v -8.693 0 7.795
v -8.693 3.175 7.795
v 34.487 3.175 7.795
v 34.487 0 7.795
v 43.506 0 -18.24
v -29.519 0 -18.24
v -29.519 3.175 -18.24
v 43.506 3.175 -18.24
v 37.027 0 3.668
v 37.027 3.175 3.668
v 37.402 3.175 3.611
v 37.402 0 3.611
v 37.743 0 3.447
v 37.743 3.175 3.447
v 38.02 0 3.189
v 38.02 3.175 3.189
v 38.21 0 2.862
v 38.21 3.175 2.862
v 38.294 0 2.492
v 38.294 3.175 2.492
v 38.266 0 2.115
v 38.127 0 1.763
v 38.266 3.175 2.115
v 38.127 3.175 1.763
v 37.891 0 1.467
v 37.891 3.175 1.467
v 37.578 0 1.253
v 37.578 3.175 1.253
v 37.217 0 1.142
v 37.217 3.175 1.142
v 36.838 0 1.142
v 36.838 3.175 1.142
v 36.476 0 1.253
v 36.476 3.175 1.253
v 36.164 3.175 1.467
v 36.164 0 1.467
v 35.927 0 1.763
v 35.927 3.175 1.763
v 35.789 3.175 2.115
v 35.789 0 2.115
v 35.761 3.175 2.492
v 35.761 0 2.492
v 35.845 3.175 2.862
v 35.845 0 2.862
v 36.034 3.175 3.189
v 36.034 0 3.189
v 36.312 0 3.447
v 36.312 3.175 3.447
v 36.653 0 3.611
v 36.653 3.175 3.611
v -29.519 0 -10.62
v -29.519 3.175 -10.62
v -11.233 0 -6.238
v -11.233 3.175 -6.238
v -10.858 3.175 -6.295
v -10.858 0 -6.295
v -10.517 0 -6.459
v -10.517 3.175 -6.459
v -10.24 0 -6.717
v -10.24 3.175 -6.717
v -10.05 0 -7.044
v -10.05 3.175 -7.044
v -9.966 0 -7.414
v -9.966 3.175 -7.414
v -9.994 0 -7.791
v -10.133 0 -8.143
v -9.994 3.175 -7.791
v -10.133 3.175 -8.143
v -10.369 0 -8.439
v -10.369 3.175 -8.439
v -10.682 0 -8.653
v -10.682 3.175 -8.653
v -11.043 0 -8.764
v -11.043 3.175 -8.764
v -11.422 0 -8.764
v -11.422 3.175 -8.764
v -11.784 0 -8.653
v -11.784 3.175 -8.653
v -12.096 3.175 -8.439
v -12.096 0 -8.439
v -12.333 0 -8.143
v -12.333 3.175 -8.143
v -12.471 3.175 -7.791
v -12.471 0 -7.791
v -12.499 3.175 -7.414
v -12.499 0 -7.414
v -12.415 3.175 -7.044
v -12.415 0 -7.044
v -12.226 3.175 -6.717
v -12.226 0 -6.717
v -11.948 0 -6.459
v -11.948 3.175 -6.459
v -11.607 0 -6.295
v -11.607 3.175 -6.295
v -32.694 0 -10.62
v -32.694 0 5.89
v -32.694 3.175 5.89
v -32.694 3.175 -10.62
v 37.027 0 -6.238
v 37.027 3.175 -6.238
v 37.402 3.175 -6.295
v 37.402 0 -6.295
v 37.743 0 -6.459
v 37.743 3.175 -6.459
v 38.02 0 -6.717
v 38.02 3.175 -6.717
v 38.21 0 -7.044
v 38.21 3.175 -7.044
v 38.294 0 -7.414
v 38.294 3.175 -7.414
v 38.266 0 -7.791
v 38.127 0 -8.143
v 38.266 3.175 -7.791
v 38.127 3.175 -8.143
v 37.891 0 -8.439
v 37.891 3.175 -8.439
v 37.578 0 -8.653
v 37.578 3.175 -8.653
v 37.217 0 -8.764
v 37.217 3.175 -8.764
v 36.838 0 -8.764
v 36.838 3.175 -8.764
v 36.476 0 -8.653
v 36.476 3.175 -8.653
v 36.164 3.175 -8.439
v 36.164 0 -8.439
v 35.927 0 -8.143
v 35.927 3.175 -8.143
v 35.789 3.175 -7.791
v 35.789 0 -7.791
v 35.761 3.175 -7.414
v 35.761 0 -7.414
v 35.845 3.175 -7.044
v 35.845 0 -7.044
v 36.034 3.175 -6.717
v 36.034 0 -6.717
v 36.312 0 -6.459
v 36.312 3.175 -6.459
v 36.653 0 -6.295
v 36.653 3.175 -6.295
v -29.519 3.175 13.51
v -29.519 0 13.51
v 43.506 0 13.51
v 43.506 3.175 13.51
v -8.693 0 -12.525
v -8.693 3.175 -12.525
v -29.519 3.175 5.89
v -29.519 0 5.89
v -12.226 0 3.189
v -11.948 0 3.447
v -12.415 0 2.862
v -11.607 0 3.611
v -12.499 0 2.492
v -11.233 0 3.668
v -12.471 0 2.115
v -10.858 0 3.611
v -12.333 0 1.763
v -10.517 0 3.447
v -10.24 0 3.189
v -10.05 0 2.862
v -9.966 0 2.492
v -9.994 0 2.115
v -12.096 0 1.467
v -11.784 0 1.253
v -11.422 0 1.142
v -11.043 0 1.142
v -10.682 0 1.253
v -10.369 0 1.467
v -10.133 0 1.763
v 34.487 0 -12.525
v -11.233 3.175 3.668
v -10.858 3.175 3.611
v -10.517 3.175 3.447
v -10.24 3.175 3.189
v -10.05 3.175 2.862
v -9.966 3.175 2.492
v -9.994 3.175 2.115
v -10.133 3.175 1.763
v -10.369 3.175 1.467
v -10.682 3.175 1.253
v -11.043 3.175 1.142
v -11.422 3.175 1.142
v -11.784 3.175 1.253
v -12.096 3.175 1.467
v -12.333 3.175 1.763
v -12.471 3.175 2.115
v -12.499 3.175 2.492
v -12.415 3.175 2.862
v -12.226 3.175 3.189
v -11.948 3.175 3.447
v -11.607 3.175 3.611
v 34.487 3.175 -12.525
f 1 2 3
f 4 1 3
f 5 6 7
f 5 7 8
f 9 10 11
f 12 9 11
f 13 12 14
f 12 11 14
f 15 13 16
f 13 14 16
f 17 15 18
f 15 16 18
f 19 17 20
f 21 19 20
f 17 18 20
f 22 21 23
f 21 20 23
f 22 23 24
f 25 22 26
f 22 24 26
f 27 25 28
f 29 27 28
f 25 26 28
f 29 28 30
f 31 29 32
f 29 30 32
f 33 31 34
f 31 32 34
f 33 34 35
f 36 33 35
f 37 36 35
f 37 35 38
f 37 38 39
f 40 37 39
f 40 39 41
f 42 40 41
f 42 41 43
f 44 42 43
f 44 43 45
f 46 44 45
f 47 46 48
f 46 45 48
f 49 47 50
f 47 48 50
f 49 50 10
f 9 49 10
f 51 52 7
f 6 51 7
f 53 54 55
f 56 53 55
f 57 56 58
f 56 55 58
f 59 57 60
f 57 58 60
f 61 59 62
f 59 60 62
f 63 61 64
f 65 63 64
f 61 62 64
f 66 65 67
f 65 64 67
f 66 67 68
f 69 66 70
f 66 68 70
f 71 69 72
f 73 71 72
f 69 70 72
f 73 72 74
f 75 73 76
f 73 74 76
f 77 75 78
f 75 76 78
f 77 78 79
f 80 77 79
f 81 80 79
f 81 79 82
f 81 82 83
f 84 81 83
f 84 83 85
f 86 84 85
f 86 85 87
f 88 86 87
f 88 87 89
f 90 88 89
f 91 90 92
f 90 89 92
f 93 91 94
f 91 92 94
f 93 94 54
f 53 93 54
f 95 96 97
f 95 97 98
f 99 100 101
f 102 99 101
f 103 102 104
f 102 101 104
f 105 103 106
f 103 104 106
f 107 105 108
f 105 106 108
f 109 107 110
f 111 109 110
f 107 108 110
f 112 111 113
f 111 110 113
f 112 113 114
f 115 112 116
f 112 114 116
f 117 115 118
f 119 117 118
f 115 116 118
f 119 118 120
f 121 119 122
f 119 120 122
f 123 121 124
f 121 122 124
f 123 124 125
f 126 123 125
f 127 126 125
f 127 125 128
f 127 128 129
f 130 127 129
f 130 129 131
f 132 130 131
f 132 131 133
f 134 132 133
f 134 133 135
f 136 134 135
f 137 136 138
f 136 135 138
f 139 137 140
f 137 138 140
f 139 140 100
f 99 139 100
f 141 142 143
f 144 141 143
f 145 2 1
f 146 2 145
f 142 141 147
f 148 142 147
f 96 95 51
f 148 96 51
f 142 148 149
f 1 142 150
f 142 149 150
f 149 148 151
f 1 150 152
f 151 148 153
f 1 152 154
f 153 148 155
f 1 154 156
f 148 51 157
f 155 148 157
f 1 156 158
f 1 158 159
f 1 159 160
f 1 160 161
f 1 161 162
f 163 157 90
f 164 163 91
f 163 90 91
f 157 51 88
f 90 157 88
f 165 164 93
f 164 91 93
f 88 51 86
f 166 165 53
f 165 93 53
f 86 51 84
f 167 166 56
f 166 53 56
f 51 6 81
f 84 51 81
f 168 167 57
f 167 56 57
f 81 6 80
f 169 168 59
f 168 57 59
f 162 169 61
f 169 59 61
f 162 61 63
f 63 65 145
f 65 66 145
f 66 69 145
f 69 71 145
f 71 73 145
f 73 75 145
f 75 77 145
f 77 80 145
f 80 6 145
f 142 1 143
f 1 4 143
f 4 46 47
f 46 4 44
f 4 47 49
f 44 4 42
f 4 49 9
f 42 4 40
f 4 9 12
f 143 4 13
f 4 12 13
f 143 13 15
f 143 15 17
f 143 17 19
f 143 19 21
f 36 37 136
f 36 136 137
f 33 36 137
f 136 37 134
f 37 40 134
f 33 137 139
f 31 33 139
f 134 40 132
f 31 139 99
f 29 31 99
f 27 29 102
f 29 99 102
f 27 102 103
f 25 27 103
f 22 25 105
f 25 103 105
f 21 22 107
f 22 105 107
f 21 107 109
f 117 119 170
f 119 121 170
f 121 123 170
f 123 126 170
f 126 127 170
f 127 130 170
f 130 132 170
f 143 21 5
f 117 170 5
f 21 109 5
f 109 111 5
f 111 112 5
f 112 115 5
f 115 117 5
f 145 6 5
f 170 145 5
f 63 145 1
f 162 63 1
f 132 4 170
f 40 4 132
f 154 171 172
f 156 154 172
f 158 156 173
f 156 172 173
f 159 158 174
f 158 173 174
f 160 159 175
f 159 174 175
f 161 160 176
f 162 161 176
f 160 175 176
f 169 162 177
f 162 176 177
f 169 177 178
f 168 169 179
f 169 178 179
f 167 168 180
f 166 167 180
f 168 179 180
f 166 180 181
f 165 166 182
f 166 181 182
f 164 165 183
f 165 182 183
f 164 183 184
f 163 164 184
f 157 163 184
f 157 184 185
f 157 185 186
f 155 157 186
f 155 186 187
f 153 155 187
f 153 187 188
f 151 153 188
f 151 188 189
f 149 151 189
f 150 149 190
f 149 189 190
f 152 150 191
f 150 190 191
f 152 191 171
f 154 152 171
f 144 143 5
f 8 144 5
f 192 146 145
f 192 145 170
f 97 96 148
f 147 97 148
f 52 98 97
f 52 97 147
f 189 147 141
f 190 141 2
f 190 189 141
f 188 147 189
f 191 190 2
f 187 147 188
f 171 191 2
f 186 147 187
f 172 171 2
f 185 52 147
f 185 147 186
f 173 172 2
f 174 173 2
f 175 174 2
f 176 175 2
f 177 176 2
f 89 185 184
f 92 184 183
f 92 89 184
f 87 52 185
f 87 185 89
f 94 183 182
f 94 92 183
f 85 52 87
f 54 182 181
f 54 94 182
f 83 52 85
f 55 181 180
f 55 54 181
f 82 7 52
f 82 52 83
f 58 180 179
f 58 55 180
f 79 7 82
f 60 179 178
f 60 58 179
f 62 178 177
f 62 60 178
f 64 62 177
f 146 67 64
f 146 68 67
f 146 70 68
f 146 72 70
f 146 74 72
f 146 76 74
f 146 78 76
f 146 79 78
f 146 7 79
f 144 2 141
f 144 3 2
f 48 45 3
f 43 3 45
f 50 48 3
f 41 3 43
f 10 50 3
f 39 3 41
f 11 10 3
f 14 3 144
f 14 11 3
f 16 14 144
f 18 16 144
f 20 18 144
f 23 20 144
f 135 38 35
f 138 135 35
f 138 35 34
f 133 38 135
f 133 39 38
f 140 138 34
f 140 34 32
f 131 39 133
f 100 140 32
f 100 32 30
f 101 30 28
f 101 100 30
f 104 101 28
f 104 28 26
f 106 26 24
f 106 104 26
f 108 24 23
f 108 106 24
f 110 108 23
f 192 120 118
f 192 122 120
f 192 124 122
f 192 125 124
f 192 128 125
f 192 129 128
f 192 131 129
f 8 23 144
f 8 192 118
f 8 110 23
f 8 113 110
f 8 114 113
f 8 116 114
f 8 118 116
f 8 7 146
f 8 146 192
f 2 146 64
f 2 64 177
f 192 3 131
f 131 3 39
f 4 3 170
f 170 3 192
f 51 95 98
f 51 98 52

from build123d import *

# Parameters (mm, degrees)
SKETCH1_W           = 76.2
SKETCH1_H           = 31.75
BOSS_EXTRUDE1_DEPTH = 3.175
SKETCH2_R           = 1.27
SKETCH2_W           = 3.175
SKETCH2_H           = 7.62
SKETCH2_W_2         = 43.18
SKETCH2_H_2         = 20.32
CUT_EXTRUDE1_DEPTH  = 3.175


with BuildPart() as part:
    # Sketch1 → Boss-Extrude1 (new body)
    with BuildSketch(Plane(origin=(0, 0, 0), x_dir=(1, 0, 0), z_dir=(0, 1, 0))):
        with Locations((5.405536898, 2.364922393)):
            Rectangle(SKETCH1_W, SKETCH1_H)
    extrude(amount=BOSS_EXTRUDE1_DEPTH)

    # Sketch2 → Cut-Extrude1 (cut)
    with BuildSketch(Plane(origin=(0, 3.175, 0), x_dir=(1, 0, 0), z_dir=(0, 1, 0))):
        with Locations(Location((37.027343522, 7.508422393, 0), (0, 0, 270))):
            Circle(SKETCH2_R)
        with Locations(Location((37.027343522, -2.397577607, 0), (0, 0, 270))):
            Circle(SKETCH2_R)
        with Locations(Location((-11.232656478, 7.508422393, 0), (0, 0, 270))):
            Circle(SKETCH2_R)
        with Locations(Location((-11.232656478, -2.397577607, 0), (0, 0, 270))):
            Circle(SKETCH2_R)
        with Locations((-31.106963102, 14.429922393)):
            Rectangle(SKETCH2_W, SKETCH2_H)
        with Locations((-31.106963102, -9.700077607)):
            Rectangle(SKETCH2_W, SKETCH2_H)
        with Locations((12.897343522, 2.364922393)):
            Rectangle(SKETCH2_W_2, SKETCH2_H_2)
    extrude(amount=-CUT_EXTRUDE1_DEPTH, mode=Mode.SUBTRACT)


solid = part.part
